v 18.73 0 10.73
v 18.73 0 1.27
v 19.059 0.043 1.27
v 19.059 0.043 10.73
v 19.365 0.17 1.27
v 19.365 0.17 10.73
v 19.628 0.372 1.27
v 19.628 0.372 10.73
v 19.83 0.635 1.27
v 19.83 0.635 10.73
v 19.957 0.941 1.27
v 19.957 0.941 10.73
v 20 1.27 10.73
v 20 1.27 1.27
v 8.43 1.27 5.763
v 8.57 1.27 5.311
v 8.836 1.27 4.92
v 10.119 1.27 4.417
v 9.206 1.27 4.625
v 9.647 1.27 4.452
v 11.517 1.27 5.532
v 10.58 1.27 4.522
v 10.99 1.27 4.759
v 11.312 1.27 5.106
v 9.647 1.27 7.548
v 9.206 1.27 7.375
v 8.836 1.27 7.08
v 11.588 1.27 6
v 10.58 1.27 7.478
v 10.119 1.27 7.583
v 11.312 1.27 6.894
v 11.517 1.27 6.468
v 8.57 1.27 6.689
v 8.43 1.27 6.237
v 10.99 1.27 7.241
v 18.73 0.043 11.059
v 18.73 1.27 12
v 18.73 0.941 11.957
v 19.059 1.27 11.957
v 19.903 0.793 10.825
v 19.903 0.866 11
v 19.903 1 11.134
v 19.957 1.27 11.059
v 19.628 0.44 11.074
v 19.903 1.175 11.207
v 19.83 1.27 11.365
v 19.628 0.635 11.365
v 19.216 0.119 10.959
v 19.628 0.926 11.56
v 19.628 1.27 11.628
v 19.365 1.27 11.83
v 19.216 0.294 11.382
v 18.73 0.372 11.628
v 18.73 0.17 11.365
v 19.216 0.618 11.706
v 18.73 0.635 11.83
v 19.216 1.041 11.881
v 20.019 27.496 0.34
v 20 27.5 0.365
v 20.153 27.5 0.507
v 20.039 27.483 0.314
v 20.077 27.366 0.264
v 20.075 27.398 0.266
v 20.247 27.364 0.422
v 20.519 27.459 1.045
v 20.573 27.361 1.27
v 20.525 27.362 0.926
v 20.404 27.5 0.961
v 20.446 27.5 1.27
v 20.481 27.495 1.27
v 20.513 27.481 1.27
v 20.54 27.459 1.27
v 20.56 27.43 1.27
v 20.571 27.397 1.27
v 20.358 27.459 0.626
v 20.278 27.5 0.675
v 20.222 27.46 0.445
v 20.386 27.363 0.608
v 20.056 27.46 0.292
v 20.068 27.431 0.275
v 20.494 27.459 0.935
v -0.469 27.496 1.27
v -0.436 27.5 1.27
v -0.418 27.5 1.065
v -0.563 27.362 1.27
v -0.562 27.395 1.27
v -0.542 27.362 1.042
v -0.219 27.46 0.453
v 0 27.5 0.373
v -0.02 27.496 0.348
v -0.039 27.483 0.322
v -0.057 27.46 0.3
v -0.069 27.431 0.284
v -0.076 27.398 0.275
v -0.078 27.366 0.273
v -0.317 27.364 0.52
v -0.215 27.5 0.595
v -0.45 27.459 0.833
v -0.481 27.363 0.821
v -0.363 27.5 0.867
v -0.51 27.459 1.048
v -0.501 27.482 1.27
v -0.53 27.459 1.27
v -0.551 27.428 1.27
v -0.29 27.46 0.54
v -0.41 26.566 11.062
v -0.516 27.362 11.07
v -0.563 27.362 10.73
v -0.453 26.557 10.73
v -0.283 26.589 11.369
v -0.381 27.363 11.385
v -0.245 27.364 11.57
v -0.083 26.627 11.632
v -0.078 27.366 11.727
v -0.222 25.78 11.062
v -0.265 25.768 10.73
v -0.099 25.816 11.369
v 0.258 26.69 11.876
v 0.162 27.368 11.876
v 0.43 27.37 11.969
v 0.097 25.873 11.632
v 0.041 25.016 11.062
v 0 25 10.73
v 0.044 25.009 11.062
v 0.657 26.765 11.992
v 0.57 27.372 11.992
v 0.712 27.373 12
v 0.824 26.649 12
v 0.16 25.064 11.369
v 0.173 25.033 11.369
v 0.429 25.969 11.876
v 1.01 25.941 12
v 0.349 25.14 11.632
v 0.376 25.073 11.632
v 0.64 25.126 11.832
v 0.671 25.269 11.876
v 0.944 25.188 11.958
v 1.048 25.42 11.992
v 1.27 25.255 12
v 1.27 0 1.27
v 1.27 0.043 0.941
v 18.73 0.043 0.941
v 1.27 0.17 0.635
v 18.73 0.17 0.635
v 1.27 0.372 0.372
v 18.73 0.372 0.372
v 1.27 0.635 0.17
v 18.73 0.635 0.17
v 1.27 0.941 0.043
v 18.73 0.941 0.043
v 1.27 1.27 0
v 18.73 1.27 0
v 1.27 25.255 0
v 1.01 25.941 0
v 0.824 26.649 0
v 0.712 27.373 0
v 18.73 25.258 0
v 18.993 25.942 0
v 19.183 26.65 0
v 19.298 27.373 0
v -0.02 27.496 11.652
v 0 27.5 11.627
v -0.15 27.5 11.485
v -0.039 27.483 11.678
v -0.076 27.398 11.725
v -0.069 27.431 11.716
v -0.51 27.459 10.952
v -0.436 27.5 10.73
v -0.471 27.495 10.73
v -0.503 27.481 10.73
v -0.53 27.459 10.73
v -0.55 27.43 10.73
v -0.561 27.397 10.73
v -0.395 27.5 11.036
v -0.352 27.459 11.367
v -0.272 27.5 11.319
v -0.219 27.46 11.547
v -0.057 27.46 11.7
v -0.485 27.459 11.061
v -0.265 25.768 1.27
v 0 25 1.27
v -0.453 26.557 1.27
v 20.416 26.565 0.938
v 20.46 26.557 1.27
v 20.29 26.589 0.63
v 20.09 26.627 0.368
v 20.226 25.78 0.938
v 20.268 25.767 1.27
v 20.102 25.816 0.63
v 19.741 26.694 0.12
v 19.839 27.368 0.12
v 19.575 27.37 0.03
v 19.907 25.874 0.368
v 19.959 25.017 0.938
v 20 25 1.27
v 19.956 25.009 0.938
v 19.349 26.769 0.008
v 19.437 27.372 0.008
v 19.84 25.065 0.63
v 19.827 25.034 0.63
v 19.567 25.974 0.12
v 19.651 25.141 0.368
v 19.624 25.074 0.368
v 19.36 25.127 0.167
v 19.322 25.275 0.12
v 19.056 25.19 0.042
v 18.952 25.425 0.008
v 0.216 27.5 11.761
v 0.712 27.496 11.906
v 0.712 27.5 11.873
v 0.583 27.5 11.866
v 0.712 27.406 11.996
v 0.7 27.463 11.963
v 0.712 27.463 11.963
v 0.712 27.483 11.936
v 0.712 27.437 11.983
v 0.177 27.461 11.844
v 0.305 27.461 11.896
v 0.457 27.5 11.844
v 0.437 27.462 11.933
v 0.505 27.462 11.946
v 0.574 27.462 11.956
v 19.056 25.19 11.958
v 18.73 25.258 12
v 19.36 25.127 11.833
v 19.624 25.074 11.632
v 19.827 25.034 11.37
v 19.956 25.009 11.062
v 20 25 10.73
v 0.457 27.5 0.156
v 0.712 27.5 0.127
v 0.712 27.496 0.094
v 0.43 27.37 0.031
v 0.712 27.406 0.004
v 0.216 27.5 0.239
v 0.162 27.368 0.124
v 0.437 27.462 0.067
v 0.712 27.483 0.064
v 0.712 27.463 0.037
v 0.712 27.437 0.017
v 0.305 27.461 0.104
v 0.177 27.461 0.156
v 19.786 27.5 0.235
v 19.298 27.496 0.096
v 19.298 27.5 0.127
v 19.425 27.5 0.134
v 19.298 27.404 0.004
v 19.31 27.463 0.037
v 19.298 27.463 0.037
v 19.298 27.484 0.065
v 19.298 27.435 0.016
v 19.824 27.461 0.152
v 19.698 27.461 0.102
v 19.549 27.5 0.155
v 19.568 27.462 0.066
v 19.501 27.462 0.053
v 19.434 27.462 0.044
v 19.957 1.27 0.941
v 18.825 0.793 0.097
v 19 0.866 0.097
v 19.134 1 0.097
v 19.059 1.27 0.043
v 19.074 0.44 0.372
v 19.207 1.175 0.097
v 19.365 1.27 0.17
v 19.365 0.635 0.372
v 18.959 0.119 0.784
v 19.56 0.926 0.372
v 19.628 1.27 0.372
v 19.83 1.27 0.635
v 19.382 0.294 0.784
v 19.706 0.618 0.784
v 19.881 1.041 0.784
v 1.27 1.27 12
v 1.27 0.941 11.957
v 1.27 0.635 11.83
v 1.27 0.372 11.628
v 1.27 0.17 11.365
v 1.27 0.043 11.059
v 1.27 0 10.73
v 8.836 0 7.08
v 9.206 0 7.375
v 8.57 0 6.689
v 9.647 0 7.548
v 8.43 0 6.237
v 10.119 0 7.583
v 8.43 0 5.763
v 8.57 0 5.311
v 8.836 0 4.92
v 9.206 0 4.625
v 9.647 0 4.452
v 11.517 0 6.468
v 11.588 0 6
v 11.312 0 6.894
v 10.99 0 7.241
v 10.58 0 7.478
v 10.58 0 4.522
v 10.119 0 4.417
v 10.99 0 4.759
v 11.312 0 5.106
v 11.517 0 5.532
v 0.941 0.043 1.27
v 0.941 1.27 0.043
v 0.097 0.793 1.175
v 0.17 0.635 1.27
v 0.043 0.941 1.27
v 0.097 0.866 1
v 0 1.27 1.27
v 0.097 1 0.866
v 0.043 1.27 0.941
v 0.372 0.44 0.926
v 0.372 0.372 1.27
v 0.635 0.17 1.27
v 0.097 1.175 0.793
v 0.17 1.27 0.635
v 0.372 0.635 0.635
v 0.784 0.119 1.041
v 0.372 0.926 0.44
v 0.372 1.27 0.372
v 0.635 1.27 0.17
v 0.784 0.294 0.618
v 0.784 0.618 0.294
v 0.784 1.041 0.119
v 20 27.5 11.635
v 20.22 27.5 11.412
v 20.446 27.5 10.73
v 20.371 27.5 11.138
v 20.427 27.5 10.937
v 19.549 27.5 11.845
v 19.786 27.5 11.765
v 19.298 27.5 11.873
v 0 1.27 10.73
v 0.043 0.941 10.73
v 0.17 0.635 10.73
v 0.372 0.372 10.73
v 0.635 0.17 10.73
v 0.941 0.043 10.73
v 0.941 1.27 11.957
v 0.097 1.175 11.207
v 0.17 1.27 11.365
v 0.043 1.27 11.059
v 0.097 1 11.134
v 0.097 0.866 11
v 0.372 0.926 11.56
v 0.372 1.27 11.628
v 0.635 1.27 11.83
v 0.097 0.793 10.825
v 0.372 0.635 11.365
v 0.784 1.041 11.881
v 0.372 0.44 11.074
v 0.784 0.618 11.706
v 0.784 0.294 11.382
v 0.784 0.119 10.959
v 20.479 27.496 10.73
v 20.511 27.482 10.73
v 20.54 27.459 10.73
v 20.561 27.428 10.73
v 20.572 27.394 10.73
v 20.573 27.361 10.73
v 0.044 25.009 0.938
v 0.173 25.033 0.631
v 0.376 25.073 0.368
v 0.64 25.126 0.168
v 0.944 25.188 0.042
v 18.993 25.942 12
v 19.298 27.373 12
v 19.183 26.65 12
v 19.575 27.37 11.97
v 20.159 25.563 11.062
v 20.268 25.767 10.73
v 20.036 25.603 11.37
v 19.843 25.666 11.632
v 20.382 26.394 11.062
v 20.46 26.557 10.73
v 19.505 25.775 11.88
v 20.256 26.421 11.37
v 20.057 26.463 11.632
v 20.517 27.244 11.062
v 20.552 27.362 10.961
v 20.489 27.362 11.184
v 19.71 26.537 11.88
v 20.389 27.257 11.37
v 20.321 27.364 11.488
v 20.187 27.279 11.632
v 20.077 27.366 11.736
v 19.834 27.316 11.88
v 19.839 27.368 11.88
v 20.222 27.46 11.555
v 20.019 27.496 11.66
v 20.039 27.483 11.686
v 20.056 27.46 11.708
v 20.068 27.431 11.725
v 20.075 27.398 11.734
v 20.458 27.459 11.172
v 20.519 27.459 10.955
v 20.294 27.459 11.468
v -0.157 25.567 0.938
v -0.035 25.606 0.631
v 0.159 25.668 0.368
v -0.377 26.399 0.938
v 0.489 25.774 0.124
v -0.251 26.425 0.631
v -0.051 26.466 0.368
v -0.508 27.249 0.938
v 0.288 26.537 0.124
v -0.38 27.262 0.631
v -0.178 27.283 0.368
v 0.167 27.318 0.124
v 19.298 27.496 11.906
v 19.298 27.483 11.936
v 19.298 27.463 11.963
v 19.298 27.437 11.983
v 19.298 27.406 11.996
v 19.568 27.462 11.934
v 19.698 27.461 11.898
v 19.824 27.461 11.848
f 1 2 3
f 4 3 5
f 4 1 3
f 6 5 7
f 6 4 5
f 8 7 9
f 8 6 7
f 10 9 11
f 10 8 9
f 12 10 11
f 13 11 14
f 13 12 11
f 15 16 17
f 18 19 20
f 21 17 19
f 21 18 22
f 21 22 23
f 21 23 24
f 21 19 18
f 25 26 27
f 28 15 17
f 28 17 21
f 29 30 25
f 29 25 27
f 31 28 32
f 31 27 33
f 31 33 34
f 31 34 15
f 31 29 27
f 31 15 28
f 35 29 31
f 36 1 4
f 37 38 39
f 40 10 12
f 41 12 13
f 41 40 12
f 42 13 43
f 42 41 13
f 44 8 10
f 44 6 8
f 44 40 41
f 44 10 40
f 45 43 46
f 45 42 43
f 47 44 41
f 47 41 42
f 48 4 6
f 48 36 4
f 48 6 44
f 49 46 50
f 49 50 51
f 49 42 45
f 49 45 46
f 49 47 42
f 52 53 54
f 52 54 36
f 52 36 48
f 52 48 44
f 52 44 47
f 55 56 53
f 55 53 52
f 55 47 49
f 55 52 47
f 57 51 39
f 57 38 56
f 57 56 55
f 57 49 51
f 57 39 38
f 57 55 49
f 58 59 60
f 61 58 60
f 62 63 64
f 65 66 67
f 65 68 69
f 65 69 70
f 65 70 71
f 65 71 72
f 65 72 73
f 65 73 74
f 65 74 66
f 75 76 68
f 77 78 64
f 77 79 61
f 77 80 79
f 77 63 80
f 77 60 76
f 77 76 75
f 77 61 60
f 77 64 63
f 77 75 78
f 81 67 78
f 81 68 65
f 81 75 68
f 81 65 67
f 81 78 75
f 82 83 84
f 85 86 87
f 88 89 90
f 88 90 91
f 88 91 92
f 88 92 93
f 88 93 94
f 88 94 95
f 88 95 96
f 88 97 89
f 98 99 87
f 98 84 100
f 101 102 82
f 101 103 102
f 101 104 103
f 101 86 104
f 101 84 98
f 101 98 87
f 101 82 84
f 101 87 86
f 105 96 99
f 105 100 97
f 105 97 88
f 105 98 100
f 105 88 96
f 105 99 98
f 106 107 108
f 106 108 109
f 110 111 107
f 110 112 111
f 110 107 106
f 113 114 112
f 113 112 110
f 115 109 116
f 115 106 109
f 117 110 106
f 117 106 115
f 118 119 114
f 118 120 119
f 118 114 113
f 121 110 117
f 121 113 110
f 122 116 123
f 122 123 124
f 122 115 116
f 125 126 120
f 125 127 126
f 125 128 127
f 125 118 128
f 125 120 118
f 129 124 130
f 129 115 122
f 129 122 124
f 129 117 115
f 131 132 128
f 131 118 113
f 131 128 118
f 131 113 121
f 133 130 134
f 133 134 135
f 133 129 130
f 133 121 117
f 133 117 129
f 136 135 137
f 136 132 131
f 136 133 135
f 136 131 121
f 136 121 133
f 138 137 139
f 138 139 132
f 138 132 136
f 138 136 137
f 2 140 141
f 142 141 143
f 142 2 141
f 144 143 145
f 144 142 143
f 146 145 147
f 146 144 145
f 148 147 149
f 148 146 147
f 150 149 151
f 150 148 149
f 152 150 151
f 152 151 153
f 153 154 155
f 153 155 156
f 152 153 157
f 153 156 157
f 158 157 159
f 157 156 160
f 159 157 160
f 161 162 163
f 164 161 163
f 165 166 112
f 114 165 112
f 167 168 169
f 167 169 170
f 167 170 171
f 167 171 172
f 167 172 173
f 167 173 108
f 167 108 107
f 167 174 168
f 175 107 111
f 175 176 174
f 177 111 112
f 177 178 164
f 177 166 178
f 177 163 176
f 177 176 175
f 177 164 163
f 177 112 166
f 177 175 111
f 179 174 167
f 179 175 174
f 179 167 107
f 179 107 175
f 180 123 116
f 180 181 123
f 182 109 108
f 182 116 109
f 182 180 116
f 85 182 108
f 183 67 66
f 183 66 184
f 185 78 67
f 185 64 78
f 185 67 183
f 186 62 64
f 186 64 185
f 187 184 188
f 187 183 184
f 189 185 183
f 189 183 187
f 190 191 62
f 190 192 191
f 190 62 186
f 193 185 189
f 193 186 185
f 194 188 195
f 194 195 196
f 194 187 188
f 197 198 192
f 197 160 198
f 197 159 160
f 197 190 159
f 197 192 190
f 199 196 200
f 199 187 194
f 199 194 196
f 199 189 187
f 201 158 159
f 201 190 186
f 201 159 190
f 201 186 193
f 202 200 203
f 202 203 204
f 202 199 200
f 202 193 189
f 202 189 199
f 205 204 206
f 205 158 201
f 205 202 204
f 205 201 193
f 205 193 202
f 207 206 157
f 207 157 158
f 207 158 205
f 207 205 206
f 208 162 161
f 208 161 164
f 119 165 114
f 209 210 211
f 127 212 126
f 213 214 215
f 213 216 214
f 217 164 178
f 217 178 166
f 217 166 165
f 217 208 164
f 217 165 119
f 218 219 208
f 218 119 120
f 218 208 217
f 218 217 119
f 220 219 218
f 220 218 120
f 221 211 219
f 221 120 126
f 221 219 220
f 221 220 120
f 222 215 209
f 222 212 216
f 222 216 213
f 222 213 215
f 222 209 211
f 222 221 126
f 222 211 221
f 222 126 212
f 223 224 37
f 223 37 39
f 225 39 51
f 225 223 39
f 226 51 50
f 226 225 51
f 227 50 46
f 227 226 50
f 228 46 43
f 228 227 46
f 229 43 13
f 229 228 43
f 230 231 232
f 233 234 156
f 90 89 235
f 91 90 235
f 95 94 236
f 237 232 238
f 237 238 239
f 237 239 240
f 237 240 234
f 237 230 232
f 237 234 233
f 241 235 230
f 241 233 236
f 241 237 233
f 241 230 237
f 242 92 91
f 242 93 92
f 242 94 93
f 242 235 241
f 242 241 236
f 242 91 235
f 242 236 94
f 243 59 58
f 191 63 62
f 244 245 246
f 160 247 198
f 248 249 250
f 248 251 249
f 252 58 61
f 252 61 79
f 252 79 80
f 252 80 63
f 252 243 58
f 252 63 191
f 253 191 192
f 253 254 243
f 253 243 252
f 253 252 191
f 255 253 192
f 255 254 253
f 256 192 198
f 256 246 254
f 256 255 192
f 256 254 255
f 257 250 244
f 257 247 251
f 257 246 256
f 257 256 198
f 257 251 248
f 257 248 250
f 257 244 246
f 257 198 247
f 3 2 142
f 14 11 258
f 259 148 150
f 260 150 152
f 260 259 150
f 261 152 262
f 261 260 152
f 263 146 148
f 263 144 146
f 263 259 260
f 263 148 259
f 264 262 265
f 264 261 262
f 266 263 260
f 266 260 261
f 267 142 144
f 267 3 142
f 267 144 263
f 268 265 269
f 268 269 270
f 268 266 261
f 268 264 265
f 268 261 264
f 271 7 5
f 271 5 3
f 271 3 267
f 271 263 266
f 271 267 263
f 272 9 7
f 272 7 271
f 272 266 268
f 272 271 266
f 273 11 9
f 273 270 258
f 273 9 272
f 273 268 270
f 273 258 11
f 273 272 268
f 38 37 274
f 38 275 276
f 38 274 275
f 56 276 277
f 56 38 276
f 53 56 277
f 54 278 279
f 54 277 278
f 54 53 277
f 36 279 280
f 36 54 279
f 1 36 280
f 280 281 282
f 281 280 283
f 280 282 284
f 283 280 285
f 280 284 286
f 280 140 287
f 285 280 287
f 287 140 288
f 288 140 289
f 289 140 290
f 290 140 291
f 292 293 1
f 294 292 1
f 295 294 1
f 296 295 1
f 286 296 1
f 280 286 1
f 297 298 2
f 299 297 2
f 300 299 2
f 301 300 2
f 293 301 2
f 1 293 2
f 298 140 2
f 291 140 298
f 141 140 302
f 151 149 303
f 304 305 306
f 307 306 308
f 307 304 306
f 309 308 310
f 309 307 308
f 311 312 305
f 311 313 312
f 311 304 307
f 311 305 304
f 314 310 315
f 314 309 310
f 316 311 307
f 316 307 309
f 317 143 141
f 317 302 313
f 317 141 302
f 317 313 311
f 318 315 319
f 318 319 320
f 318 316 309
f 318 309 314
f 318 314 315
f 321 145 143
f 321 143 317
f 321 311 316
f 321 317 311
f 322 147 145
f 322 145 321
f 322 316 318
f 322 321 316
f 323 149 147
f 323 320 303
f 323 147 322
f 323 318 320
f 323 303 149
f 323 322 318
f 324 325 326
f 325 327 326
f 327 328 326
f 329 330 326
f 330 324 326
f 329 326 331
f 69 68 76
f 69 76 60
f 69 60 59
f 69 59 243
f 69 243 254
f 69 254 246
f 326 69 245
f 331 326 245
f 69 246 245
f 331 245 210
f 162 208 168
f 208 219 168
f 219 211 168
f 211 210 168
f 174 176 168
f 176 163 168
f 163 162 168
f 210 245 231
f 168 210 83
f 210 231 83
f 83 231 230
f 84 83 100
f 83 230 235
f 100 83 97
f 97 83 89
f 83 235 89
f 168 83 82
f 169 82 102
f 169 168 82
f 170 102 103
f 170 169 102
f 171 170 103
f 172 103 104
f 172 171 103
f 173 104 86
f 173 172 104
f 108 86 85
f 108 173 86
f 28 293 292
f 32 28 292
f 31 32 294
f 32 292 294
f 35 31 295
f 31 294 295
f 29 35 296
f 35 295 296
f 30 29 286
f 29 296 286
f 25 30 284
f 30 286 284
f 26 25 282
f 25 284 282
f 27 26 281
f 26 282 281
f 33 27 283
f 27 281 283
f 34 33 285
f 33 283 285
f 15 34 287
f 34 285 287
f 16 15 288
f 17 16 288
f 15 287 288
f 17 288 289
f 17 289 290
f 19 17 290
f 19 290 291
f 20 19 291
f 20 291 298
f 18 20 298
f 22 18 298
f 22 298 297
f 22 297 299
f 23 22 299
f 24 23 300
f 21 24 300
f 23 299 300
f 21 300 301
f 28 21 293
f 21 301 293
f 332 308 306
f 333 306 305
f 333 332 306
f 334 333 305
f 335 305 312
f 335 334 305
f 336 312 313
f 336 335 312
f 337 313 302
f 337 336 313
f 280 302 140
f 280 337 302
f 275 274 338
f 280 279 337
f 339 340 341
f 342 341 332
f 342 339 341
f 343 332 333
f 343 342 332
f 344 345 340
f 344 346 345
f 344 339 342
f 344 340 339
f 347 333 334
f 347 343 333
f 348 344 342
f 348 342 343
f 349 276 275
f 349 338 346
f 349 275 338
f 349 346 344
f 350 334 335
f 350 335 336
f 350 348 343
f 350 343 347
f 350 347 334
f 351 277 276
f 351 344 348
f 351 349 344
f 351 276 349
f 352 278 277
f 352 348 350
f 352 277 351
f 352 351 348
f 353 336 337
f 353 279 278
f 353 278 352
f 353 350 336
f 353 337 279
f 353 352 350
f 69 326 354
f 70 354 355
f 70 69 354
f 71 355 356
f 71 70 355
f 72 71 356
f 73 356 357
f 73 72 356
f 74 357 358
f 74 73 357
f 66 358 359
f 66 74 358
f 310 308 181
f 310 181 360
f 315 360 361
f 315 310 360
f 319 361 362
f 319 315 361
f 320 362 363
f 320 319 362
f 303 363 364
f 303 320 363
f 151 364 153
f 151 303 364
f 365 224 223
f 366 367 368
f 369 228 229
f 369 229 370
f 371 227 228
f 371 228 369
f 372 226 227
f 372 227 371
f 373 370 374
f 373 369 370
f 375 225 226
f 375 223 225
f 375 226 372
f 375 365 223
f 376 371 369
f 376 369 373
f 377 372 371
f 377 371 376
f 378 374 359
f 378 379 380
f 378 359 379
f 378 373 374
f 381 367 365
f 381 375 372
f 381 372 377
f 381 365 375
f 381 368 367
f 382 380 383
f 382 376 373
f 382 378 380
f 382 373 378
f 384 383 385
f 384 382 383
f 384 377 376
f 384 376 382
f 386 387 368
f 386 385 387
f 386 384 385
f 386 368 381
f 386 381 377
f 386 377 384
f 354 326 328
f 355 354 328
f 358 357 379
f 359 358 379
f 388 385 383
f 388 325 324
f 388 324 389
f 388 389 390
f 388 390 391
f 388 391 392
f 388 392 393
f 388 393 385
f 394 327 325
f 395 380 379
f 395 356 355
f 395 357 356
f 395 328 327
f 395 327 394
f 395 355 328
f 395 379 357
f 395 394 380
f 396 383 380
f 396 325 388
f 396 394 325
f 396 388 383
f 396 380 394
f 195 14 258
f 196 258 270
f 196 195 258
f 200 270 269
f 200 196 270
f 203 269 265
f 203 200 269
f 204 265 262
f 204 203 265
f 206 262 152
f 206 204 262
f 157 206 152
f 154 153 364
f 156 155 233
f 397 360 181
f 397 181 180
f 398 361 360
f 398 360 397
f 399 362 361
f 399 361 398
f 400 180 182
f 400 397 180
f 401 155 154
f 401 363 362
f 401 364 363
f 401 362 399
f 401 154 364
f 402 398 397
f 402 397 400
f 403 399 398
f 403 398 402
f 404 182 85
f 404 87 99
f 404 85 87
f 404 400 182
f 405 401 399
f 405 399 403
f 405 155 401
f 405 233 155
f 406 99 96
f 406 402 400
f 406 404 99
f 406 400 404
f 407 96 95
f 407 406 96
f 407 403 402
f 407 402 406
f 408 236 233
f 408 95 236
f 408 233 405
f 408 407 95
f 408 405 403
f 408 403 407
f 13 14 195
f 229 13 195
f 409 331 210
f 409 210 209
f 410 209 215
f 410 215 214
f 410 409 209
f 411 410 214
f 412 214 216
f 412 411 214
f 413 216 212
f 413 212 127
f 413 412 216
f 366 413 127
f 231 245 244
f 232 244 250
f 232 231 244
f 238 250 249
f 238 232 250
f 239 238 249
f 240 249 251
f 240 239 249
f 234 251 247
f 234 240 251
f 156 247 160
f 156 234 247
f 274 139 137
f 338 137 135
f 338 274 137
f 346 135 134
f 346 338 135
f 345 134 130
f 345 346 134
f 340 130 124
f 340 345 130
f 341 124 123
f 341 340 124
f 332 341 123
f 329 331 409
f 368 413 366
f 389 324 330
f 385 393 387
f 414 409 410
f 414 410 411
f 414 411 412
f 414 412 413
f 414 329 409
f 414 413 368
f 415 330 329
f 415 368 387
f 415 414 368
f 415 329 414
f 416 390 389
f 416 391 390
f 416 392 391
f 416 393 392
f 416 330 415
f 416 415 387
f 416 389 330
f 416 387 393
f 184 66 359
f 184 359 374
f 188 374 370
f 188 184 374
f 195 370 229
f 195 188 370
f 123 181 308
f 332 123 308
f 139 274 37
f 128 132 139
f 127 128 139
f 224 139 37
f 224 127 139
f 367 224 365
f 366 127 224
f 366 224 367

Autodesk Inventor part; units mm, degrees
ref_plane "YZ Plane" through (0, 0, 0) normal (1, 0, 0) x (0, 1, 0)
ref_plane "XZ Plane" through (0, 0, 0) normal (0, 1, 0) x (-1, 0, 0)
ref_plane "XY Plane" through (0, 0, 0) normal (0, 0, 1) x (1, 0, 0)
sketch "Sketch1" plane through (0, 0, 0) normal (0, 0, 1) x (1, 0, 0)
  line L0 (0, 0) -> (20, 0)
  line L1 (20, 0) -> (20, 25)
  line L2 (0, 25) -> (0, 0)
  line L3 (0, 27.5) -> (-0.5738, 27.5)
  line L4 (20, 27.5) -> (20.5842, 27.5)
  arc A0 (-0.5738, 27.5) -> (0, 25) centre (7.6984, 28.0827) ccw
  arc A1 (20, 25) -> (20.5842, 27.5) centre (12.3264, 28.1114) ccw
  line L5 (-0.5738, 27.5) -> (20, 27.5)
  dimension "d0" = 20
  dimension "d1" = 25
extrude "Extrusion1" add sketch "Sketch1" along normal blind 12
fillet "Fillet1" radius 1.27 12 edges at (10, 0, 12) (20, 12.5, 12) (20, 0, 6) (20, 12.5, 0) (10, 0, 0) (0, 0, 6) (0, 12.5, 0) (0, 12.5, 12) (20.3896, 26.2272, 12) (20.3896, 26.2272, 0) (-0.3841, 26.2277, 0) (-0.3841, 26.2277, 12)
fillet "Fillet2" radius 0.127 7 edges at (-0.2004, 27.5, 11.6285) (-0.5738, 27.5, 6) (-0.2004, 27.5, 0.3715) (19.6696, 27.5, 0.0516) (20.5842, 27.5, 6) (19.6696, 27.5, 11.9484) (10.005, 27.5, 12)
sketch "Sketch2" plane through (1.27, 0, 1.27) normal (0, -1, 0) x (1, 0, 0)
  line L0 (0, 0) -> (-1.27, 0) projected
  line L1 (0, 9.46) -> (0, 10.73) projected
  line L2 (0, 0) -> (0, 9.46)
  circle A0 centre (8.73, 4.73) radius 1.5875
  point P0 (-1.27, -1.27)
extrude "Extrusion2" cut sketch "Sketch2" against normal blind 1.27
properties part number "Tc-1"
